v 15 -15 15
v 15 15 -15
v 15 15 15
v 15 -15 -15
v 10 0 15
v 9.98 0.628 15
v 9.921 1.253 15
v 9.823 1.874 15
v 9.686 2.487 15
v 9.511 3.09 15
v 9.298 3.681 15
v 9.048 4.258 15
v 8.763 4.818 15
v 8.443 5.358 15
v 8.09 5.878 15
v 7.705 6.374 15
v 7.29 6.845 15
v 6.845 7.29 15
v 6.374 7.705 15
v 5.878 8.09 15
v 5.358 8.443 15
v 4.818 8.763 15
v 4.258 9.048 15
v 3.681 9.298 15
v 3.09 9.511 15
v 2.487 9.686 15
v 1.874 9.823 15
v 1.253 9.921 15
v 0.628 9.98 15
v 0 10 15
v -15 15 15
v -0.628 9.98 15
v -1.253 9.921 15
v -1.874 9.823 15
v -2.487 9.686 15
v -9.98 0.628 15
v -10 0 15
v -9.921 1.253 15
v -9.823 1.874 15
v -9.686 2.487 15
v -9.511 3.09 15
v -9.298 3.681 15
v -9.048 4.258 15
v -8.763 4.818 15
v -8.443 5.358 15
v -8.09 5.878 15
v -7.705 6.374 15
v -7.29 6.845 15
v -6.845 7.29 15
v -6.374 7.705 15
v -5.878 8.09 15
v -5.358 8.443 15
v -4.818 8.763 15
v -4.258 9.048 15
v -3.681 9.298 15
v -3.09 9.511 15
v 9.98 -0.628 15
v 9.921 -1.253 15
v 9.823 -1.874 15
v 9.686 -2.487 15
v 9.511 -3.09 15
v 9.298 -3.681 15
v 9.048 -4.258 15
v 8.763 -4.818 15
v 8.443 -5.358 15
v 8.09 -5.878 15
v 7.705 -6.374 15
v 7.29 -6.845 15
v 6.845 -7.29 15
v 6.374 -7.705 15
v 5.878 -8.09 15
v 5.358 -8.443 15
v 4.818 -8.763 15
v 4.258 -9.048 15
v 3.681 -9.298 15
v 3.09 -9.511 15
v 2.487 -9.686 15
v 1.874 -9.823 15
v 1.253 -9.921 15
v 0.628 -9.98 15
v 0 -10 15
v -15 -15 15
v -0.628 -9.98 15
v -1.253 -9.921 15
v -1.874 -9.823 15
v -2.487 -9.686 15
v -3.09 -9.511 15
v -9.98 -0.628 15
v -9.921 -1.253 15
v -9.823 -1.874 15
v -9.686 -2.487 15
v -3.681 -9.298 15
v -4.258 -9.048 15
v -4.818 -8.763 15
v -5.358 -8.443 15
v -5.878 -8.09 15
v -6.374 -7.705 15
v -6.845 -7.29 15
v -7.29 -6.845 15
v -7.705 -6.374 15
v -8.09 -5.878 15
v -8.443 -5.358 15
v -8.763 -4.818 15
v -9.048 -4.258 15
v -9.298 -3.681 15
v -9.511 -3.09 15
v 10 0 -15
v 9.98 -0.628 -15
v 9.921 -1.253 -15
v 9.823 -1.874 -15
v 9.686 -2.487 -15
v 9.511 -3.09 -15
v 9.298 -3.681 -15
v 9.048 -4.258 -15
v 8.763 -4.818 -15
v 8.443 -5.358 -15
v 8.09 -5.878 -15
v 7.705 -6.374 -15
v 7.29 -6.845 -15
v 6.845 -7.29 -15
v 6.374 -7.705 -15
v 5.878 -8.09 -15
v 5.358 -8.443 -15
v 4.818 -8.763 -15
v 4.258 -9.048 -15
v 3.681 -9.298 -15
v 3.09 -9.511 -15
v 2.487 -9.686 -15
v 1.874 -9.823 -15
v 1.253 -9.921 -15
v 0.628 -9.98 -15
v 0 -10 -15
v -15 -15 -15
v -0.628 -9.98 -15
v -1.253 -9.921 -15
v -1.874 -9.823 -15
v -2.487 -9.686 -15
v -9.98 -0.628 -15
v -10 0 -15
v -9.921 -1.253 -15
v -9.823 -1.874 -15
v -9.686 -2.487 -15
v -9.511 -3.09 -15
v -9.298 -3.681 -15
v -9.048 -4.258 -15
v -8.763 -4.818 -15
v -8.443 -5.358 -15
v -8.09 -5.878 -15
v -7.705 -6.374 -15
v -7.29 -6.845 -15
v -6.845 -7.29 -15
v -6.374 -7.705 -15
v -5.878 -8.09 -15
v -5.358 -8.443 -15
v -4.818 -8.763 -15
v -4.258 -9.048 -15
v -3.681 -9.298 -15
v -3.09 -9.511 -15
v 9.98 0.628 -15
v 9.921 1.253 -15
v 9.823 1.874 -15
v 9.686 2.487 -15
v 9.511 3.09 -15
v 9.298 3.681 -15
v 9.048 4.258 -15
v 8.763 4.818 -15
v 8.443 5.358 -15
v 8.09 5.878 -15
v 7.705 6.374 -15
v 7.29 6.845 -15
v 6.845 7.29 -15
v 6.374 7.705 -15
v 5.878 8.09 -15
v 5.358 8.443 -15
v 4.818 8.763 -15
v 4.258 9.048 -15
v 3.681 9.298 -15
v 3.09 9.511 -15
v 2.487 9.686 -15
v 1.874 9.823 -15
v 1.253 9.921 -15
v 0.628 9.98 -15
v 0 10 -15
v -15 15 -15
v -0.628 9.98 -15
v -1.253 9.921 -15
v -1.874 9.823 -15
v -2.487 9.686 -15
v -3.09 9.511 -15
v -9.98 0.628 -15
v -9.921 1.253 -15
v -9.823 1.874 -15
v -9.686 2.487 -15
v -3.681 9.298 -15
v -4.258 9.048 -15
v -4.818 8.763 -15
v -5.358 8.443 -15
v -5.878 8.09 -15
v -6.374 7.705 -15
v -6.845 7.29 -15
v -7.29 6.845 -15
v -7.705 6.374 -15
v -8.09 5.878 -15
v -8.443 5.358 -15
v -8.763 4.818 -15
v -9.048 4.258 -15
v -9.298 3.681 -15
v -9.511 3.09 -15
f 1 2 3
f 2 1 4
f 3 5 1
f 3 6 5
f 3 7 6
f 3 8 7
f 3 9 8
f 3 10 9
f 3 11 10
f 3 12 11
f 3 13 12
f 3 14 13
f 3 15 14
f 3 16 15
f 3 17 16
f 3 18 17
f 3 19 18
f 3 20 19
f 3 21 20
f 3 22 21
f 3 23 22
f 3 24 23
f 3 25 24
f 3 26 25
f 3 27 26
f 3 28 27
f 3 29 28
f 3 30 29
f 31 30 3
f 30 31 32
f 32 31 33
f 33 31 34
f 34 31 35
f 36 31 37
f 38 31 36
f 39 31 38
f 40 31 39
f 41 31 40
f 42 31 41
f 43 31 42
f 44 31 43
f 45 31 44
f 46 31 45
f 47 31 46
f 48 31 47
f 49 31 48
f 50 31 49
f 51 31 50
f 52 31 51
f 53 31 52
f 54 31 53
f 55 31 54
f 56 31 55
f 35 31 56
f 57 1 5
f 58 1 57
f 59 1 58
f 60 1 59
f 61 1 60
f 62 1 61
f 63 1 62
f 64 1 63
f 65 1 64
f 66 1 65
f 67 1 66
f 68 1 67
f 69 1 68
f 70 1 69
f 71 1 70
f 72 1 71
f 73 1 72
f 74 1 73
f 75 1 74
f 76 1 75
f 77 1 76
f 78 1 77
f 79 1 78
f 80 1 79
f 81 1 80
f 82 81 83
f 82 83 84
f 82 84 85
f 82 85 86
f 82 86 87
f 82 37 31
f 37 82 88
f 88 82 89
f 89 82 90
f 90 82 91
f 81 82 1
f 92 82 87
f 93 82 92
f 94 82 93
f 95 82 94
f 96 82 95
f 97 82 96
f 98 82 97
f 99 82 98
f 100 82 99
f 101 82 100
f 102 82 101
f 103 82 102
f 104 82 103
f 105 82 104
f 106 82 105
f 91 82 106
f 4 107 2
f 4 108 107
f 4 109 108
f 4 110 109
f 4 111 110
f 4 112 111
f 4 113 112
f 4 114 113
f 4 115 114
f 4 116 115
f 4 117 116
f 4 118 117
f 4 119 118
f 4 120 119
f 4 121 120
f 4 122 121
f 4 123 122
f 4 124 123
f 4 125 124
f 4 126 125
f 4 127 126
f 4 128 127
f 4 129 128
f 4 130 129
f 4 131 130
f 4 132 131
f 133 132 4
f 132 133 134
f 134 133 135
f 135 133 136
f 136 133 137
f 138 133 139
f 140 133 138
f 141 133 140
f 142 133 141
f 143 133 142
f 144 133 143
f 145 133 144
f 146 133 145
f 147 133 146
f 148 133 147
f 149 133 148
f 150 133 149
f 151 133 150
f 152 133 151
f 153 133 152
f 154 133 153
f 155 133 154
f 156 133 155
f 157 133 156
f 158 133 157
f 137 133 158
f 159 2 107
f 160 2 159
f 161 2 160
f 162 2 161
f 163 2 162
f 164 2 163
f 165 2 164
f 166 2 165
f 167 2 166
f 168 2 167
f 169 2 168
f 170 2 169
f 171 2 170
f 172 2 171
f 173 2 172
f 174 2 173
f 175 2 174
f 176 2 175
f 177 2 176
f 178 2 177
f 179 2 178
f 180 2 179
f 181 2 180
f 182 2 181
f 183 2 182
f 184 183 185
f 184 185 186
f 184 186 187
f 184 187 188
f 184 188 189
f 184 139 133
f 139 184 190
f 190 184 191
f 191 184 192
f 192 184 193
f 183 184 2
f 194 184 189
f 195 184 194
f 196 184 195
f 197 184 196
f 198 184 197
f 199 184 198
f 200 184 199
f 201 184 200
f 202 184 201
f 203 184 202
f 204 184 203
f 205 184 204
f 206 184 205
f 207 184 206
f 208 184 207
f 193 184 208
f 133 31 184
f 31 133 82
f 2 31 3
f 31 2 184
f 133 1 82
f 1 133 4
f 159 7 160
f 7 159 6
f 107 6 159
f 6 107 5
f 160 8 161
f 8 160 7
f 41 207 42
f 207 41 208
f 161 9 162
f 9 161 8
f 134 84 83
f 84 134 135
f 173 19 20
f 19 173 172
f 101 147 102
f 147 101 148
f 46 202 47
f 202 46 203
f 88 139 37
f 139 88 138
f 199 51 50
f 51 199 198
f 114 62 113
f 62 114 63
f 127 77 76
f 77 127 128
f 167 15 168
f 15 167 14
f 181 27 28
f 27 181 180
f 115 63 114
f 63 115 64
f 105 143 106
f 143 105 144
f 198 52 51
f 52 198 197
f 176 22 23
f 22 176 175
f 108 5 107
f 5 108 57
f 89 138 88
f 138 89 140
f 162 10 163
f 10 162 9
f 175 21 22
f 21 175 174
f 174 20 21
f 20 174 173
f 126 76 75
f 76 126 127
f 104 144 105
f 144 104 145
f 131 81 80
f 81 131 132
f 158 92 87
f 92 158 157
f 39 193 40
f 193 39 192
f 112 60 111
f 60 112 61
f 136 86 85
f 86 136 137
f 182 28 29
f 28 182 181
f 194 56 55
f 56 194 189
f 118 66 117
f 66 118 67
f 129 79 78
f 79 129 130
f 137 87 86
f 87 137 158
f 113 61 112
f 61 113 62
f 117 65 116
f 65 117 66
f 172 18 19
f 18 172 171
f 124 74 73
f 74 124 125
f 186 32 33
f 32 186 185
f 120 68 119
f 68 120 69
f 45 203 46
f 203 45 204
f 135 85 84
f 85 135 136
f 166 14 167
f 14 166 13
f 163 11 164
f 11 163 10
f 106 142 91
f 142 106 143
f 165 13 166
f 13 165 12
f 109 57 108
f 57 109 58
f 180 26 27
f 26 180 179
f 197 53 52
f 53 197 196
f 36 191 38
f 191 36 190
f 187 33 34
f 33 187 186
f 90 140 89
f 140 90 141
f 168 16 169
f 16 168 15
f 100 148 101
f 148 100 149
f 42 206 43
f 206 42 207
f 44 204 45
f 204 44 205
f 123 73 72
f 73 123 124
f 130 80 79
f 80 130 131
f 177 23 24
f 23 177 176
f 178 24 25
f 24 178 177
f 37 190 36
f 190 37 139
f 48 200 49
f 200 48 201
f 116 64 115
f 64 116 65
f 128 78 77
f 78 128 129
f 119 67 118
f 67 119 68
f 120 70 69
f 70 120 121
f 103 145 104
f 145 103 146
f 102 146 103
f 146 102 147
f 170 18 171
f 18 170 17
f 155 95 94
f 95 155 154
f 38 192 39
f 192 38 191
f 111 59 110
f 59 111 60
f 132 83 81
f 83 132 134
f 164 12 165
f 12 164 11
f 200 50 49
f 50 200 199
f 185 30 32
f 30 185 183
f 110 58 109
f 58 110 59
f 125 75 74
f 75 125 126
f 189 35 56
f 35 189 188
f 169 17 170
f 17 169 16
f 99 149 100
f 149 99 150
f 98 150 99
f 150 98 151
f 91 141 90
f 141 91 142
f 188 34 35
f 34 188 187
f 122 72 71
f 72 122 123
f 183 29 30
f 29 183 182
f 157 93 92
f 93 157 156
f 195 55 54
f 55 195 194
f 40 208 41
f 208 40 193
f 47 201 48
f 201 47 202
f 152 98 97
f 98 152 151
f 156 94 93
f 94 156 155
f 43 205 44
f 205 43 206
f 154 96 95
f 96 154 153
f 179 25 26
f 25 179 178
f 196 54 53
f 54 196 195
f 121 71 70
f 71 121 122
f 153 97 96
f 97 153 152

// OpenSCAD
//difference()
//{
//    translate ([-15,-15,-15])cube([30,30,30]);
//    translate ([-20,-10,-10])cube([40,20,20]);
//    translate ([-10,-20,-10])cube([20,40,20]);
//    translate ([-10,-10,-20])cube([20,20,40]);
//}

difference()
{
    translate ([-15,-15,-15])cube([30,30,30]);
    cylinder(h=40, r=10, center=true, $fn=100);
    //translate ([-10,-20,-10])cube([20,40,20]);
    //translate ([-10,-10,-20])cube([20,20,40]);
}
